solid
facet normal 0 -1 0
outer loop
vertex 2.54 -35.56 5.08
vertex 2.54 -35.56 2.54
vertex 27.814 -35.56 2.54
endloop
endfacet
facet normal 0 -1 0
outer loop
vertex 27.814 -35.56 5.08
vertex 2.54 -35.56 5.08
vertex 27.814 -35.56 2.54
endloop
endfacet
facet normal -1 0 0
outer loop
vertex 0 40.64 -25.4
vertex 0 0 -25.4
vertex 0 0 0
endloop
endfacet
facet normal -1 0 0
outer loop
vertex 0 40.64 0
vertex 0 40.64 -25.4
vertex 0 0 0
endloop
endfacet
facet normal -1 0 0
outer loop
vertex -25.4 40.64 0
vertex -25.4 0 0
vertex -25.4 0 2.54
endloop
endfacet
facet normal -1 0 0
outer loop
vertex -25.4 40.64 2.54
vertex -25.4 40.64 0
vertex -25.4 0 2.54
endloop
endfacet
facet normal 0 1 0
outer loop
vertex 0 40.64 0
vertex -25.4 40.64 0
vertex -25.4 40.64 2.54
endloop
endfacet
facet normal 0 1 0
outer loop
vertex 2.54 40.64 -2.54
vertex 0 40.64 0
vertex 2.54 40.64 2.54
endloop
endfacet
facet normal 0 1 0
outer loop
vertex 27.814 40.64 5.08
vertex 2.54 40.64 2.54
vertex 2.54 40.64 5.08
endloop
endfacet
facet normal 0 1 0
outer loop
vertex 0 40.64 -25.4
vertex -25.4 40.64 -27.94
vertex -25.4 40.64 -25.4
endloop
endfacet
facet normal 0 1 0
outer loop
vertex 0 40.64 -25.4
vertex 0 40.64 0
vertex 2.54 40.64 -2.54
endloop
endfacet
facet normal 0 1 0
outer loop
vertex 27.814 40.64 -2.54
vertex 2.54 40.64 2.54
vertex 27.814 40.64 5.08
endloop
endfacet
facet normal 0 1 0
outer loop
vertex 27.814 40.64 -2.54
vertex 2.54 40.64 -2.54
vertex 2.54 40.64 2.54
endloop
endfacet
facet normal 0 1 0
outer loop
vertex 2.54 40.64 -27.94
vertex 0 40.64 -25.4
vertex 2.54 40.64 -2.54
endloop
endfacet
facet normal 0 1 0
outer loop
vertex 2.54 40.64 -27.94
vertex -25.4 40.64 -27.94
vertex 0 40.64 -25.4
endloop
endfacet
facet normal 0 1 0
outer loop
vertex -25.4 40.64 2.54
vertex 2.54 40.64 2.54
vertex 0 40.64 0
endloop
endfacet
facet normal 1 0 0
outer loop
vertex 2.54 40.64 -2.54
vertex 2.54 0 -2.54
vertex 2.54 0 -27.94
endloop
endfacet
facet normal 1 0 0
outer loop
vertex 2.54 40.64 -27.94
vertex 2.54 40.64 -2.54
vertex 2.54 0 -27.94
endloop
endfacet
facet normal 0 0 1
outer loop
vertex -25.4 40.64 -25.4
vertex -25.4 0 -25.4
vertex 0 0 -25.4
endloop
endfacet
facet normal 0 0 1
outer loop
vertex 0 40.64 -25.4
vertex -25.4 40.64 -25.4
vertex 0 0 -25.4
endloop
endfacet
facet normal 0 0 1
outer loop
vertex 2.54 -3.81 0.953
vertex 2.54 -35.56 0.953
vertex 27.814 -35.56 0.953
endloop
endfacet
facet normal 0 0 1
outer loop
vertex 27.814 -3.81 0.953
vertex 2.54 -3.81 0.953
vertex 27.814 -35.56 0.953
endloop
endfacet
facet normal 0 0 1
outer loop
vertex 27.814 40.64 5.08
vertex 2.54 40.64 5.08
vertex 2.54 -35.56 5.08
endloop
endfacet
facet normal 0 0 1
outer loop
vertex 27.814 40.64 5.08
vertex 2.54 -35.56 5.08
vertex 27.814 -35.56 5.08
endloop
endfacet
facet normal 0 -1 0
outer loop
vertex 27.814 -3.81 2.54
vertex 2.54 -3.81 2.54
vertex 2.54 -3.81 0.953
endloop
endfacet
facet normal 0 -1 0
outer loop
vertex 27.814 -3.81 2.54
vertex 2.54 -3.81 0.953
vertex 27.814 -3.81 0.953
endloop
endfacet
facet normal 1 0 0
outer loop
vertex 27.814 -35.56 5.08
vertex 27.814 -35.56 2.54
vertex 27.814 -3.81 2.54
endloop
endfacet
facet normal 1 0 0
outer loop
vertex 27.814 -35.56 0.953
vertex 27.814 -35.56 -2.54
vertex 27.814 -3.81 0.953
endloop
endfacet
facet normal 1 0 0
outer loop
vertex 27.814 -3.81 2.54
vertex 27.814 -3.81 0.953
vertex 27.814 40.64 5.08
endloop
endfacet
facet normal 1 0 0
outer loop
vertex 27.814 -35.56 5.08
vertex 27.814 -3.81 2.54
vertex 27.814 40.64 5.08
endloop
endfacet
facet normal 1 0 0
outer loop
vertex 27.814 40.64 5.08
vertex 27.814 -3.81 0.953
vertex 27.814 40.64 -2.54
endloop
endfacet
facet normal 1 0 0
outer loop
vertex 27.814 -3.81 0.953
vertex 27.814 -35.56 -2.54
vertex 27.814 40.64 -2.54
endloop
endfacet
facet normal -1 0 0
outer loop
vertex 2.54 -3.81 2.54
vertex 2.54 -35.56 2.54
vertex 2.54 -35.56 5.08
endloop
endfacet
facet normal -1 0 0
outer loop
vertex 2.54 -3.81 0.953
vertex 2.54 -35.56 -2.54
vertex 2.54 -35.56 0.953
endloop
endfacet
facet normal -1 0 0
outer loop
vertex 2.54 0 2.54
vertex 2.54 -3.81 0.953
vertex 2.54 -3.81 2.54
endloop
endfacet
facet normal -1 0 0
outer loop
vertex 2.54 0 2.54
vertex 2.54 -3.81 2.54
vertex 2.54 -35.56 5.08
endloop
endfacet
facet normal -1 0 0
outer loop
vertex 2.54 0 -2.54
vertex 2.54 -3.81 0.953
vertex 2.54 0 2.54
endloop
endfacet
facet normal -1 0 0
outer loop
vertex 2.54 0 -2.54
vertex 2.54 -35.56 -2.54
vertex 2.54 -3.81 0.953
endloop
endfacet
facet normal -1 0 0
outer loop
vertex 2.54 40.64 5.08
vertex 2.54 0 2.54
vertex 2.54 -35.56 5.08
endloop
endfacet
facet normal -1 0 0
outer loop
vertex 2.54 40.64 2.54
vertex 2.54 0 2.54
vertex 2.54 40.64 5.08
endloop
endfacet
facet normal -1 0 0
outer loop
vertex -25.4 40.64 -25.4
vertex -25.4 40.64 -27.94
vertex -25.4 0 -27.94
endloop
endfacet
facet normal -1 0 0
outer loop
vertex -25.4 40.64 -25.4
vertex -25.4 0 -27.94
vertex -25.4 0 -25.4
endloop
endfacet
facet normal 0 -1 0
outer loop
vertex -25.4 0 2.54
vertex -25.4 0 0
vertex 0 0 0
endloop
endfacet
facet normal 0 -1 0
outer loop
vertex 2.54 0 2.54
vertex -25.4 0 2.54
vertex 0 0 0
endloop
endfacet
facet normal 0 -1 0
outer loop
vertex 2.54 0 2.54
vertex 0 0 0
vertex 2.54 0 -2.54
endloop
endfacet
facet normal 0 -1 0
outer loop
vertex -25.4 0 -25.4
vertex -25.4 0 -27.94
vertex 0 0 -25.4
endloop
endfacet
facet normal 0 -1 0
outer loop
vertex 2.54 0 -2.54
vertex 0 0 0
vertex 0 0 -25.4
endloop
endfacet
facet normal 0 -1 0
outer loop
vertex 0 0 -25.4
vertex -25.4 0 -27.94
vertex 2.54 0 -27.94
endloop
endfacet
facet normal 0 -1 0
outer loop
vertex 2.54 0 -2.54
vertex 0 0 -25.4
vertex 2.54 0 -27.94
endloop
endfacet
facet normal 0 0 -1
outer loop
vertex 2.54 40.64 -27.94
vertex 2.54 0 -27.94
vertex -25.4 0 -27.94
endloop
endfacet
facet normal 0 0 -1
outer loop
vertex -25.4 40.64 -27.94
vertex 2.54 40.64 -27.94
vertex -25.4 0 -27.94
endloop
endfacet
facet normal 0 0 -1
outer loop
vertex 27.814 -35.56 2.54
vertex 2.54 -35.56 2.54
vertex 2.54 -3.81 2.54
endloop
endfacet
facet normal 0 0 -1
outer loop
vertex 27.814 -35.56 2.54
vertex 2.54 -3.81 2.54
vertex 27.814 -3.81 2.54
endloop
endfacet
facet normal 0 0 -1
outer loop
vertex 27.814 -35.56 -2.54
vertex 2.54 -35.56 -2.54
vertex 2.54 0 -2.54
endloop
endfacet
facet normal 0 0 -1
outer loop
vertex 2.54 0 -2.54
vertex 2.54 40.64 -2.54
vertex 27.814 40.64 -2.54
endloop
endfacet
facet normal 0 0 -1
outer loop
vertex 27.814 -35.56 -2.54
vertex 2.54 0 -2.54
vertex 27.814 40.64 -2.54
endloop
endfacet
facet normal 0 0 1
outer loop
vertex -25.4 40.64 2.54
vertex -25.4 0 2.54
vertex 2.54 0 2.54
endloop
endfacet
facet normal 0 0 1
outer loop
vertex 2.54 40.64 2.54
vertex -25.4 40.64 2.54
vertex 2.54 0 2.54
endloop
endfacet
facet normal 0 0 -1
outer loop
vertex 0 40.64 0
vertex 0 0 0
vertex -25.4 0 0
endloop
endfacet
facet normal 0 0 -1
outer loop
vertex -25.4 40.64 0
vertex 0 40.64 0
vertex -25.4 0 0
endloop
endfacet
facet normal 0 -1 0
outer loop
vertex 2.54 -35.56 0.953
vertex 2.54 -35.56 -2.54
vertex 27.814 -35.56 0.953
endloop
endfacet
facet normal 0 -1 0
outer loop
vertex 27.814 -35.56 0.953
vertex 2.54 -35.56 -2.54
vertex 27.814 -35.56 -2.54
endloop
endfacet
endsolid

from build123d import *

# Parameters (mm, degrees)
EXTRUDE_THIN1_DEPTH      = 40.64
BOSS_EXTRUDE2_DEPTH      = 2.54
BOSS_EXTRUDE2_DEPTH_BACK = 5.08
SKETCH7_W                = 25.274399357
SKETCH7_H                = 76.2
SKETCH10_W               = 25.274399357
SKETCH10_H               = 1.587143393
CUT_EXTRUDE10_DEPTH      = 31.75


with BuildPart() as part:
    # Sketch1 → Extrude-Thin1 (new body)
    with BuildSketch(Plane(origin=(0, 0, 0), x_dir=(1, 0, 0), z_dir=(0, 1, 0))):
        Polygon((-25.4, 25.4), (0, 25.4), (0, 0), (-25.4, 0), (-25.4, -2.54), (2.54, -2.54), (2.54, 27.94), (-25.4, 27.94), align=None)
    extrude(amount=EXTRUDE_THIN1_DEPTH)

    # Sketch7 → Boss-Extrude2 (add, two sides: drawn at the far end of the back side and taken through both)
    with BuildSketch(Plane.XY.offset(2.54).offset(-BOSS_EXTRUDE2_DEPTH_BACK)):
        with Locations((15.177199679, 2.54)):
            Rectangle(SKETCH7_W, SKETCH7_H)
    extrude(amount=BOSS_EXTRUDE2_DEPTH + BOSS_EXTRUDE2_DEPTH_BACK)

    # Sketch10 → Cut-Extrude10 (cut)
    with BuildSketch(Plane.XZ.offset(35.56)):
        with Locations((15.177199679, 1.746428304)):
            Rectangle(SKETCH10_W, SKETCH10_H)
    extrude(amount=-CUT_EXTRUDE10_DEPTH, mode=Mode.SUBTRACT)


solid = part.part
